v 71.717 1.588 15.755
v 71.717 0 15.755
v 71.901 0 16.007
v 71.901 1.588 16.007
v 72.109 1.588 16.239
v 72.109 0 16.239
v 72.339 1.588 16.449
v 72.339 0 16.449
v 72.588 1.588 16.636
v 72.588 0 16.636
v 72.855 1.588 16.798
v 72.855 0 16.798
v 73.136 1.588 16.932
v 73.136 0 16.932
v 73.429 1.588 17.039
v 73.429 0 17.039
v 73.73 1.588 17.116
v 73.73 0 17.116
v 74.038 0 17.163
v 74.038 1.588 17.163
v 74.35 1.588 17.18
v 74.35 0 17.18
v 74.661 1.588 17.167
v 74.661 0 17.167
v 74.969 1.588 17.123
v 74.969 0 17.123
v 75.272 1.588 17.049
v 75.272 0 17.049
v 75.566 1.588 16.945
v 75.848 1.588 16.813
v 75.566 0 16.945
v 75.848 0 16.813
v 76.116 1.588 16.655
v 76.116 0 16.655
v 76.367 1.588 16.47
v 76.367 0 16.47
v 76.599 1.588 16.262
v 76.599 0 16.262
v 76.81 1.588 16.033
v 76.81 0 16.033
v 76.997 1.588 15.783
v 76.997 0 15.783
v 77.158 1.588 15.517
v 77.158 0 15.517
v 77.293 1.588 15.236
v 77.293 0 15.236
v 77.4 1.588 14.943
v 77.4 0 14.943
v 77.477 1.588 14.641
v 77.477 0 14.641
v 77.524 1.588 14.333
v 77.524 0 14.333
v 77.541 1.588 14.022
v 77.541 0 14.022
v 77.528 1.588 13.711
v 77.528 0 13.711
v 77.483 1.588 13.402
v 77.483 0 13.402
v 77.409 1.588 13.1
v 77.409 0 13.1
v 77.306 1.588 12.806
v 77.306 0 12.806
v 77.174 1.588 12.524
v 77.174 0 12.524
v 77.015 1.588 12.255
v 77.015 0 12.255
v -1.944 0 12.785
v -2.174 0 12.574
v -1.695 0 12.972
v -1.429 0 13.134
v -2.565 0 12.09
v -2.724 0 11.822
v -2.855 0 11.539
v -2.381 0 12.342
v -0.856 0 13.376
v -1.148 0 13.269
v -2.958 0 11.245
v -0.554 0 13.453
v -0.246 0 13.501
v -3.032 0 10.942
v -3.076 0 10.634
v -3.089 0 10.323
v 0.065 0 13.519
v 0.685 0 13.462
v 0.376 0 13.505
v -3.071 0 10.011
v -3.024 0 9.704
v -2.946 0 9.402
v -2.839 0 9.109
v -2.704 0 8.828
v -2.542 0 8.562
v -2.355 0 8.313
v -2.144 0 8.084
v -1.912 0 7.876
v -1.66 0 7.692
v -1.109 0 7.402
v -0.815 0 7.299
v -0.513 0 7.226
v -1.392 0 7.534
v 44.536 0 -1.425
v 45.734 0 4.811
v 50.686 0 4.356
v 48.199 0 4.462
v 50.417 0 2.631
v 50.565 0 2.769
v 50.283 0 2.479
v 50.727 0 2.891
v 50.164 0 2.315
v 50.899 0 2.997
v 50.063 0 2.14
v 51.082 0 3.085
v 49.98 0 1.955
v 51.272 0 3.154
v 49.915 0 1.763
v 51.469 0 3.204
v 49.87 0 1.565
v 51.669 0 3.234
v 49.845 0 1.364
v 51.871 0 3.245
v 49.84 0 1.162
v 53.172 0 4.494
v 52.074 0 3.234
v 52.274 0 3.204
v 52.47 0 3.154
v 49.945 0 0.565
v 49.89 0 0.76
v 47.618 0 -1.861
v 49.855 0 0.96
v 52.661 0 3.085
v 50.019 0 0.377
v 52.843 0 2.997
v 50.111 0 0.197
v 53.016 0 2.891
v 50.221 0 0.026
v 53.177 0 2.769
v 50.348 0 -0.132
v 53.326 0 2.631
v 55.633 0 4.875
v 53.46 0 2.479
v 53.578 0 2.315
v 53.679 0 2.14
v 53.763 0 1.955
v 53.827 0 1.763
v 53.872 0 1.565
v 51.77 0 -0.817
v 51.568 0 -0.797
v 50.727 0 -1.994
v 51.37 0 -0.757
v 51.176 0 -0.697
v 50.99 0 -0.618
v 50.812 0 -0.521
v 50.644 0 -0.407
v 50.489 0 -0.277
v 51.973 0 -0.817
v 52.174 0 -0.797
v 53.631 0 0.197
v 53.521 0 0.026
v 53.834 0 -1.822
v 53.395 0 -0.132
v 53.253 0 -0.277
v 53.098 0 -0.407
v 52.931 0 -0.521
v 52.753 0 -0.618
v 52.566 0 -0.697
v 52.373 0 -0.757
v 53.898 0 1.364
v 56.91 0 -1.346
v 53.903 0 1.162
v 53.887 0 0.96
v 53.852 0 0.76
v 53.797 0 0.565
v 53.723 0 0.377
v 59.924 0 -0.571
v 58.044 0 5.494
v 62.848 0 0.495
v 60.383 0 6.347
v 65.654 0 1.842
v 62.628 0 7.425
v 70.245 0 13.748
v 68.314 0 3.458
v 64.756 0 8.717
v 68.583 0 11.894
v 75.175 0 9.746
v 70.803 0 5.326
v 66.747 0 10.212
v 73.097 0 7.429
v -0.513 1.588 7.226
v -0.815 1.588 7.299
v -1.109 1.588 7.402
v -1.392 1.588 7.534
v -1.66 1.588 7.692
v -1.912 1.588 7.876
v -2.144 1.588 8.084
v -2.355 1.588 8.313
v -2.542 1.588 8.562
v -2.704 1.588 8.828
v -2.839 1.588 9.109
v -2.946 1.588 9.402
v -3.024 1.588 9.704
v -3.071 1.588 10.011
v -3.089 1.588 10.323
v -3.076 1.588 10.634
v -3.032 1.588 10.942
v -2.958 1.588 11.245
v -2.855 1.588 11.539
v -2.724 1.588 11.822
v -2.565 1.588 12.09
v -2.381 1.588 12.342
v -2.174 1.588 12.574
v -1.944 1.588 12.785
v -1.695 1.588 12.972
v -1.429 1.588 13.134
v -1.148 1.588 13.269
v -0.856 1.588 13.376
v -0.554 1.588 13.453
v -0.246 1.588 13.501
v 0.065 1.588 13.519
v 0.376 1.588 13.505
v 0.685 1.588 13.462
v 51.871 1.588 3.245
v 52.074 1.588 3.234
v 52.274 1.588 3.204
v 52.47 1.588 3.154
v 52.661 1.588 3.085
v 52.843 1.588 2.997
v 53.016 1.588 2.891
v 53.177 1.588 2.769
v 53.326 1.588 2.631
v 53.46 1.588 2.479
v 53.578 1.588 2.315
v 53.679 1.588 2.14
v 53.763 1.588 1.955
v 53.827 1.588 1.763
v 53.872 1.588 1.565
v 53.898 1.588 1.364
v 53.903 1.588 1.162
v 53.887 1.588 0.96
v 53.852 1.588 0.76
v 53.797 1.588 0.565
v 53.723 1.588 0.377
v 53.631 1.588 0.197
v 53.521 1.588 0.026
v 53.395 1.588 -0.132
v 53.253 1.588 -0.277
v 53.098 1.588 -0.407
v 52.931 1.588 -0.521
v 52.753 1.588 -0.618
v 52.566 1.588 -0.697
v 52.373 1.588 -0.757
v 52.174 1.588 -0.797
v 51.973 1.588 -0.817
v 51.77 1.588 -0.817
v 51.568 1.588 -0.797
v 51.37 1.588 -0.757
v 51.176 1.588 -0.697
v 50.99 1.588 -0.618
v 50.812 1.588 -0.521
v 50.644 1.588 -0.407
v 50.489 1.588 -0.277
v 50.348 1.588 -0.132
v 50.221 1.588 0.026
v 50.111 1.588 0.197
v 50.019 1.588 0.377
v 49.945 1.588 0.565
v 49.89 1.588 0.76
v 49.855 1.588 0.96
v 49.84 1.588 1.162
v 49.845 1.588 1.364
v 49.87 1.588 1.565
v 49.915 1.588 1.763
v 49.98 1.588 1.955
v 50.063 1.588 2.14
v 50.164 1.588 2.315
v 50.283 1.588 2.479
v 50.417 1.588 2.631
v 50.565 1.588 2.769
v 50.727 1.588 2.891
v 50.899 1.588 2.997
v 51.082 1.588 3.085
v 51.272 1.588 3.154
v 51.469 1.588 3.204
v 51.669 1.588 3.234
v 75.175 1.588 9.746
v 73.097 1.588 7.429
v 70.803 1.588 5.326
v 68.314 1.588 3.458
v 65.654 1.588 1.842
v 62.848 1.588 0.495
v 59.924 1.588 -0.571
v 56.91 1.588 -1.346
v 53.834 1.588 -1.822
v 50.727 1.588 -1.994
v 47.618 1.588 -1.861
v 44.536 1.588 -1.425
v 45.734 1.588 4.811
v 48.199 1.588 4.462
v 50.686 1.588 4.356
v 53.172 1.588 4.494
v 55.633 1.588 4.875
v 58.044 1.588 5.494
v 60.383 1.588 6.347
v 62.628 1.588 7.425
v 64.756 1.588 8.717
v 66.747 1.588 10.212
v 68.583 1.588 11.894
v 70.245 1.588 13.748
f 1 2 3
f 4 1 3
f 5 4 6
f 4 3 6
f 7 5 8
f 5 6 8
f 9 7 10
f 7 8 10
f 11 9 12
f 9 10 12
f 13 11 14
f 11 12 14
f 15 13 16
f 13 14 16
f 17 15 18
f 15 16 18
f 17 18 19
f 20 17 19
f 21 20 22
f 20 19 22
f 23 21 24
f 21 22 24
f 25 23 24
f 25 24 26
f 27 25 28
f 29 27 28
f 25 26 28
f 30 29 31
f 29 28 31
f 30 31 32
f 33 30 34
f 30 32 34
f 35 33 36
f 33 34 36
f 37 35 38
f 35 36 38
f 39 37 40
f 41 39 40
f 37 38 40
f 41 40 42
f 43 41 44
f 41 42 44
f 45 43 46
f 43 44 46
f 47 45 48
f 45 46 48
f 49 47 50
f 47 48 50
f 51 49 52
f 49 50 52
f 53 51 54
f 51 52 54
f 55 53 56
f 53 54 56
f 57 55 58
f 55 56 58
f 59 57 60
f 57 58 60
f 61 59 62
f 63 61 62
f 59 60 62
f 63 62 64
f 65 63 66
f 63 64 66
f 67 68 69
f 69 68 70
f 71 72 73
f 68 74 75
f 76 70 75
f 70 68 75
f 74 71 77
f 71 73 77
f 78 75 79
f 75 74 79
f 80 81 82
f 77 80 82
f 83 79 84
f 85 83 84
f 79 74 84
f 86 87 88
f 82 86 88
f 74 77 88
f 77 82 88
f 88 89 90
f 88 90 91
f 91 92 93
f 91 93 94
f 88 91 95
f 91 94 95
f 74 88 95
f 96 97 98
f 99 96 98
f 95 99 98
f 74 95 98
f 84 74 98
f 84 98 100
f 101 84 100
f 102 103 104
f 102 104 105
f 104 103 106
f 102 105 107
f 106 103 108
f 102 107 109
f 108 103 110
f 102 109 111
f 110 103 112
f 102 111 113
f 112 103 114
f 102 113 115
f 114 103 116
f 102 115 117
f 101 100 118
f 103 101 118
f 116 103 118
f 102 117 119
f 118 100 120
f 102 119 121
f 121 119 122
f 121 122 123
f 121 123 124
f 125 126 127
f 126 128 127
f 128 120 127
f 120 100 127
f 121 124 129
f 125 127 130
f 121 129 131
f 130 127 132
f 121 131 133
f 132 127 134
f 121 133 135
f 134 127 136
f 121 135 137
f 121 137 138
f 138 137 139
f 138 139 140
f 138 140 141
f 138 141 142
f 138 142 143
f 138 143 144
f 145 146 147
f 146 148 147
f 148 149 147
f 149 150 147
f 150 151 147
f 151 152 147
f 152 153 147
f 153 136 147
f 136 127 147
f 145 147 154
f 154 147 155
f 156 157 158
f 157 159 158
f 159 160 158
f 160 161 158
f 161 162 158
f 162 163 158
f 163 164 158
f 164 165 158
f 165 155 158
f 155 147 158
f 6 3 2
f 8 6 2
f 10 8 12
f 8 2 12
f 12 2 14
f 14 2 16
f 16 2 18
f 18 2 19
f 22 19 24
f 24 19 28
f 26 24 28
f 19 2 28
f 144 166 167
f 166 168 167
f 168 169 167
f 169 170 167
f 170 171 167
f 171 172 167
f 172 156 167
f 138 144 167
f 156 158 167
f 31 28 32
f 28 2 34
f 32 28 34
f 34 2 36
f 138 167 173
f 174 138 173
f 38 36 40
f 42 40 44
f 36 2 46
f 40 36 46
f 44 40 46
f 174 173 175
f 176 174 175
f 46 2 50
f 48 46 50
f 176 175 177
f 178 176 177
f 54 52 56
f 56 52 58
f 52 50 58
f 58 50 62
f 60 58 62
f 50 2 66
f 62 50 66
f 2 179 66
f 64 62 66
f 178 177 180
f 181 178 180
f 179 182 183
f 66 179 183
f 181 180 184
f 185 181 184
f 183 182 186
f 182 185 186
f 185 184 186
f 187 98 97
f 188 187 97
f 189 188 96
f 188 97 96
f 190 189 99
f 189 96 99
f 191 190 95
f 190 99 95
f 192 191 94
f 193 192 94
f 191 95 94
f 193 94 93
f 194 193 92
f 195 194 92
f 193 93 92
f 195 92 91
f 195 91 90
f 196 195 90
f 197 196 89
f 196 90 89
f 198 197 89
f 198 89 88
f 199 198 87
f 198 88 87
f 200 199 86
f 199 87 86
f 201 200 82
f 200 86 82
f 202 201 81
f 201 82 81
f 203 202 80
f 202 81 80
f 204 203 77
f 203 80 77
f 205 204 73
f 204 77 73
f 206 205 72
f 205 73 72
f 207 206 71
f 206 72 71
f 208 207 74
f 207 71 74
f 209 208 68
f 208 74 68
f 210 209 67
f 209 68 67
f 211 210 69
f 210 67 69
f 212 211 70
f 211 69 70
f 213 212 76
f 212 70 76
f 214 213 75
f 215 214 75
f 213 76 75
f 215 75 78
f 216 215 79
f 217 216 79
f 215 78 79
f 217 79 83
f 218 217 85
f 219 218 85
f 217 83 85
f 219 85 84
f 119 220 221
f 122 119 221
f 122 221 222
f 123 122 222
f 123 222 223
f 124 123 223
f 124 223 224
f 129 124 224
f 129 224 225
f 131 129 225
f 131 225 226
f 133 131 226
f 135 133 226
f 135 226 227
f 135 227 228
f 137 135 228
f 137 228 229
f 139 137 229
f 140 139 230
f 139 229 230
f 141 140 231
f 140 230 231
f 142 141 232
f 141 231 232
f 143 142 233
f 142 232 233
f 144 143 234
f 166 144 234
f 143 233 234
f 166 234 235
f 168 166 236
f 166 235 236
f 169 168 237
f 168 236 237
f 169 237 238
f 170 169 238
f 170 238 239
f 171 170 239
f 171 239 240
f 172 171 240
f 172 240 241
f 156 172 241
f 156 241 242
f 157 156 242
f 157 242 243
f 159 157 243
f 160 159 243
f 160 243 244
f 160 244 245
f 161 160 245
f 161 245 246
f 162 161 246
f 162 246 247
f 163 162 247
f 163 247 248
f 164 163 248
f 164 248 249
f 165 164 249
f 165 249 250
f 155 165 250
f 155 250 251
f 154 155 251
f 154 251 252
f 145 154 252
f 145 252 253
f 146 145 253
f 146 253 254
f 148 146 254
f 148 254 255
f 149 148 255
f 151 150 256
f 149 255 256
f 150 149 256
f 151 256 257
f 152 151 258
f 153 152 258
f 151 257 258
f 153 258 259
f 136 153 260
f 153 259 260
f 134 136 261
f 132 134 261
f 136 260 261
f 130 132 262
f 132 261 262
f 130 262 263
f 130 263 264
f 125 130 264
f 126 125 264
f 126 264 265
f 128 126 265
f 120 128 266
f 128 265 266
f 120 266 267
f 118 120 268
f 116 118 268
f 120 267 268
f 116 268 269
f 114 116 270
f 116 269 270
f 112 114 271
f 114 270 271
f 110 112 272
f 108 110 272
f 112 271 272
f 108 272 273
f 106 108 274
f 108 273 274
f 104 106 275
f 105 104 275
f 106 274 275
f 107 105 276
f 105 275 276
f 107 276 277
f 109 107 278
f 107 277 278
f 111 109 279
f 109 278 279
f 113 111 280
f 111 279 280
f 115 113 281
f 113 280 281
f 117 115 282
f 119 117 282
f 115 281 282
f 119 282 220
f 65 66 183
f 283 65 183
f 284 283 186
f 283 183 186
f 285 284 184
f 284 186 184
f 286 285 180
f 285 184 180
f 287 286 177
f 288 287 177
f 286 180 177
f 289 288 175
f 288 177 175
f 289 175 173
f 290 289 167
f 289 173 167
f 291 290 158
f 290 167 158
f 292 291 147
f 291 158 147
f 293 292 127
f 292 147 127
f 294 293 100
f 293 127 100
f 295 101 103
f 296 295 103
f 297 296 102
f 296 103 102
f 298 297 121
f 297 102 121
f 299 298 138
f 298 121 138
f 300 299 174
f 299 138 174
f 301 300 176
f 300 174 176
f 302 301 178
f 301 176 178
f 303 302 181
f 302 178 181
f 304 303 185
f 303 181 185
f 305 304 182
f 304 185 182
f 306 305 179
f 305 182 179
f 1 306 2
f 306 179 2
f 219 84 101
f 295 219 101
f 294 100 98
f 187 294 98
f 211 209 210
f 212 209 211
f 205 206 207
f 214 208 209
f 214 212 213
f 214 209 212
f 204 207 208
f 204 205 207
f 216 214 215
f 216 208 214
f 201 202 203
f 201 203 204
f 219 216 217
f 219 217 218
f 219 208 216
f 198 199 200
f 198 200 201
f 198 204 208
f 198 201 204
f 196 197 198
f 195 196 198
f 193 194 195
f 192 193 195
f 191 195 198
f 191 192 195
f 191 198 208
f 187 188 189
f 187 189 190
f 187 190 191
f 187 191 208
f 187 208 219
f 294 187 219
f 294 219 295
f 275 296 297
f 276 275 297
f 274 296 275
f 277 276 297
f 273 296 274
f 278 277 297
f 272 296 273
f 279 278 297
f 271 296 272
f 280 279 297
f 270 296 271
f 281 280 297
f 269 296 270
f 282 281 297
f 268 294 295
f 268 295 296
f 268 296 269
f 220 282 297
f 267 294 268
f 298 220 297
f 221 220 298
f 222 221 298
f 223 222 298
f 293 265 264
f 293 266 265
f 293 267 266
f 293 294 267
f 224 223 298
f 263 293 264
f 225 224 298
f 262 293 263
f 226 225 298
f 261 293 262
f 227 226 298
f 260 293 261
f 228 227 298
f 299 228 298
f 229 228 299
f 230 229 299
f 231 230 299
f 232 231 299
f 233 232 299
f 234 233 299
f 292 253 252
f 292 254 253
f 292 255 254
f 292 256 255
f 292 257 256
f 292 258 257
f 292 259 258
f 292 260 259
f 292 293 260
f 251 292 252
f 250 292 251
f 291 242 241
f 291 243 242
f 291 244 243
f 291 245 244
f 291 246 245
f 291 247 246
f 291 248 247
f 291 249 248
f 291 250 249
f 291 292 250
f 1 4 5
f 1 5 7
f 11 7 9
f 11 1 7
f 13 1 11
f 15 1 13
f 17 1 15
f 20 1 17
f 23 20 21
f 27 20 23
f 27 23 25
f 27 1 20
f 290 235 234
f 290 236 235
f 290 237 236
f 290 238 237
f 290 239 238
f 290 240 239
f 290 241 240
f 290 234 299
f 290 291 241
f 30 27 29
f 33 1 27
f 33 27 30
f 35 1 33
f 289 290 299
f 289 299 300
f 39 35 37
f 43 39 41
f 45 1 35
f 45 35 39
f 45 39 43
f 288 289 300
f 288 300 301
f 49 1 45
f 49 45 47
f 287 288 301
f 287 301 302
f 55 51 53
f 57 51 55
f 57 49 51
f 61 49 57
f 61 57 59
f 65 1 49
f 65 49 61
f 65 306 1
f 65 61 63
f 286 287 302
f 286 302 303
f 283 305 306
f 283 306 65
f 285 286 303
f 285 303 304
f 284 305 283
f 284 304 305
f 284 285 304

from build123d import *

# Parameters (mm, degrees)
BOSS_EXTRUDE1_DEPTH = 1.5875
SKETCH3_R           = 2.032
CUT_EXTRUDE1_DEPTH  = 80.437624756


with BuildPart() as part:
    # Sketch2 → Boss-Extrude1 (new body)
    with BuildSketch(Plane(origin=(0, 0, 0), x_dir=(1, 0, 0), z_dir=(0, 1, 0))):
        with BuildLine():
            Line((44.536177097, 1.424957669), (-0.512568563, -7.225605856))
            ThreePointArc((-0.512568563, -7.225605856), (-3.031855718, -10.942384331), (0.684922757, -13.461671486))
            Line((0.684922757, -13.461671486), (45.733668417, -4.811107961))
            ThreePointArc((45.733668417, -4.811107961), (60.383311669, -6.347108045), (71.717083543, -15.755453212))
            ThreePointArc((71.717083543, -15.755453212), (76.116254433, -16.654644785), (77.015446005, -12.255473895))
            ThreePointArc((77.015446005, -12.255473895), (62.848231163, -0.495042436), (44.536177097, 1.424957669))
        make_face()
    extrude(amount=BOSS_EXTRUDE1_DEPTH)

    # Sketch3 → Cut-Extrude1 (cut, through all)
    with BuildSketch(Plane(origin=(0, 1.5875, 0), x_dir=(1, 0, 0), z_dir=(0, 1, 0))):
        with Locations(Location((51.871233594, -1.212563202, 0), (0, 0, 270))):
            Circle(SKETCH3_R)
    extrude(amount=-CUT_EXTRUDE1_DEPTH, mode=Mode.SUBTRACT)


solid = part.part
